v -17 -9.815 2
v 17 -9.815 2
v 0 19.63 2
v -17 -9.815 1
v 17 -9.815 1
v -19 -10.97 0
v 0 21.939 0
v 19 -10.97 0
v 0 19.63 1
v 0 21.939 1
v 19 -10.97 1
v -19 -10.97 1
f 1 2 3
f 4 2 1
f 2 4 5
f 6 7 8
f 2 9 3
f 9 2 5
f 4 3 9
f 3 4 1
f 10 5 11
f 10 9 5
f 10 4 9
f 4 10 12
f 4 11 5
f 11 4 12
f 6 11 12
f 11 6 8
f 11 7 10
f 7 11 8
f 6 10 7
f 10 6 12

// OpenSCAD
function centroid(p1, p2, p3) =
  [
    (p1.x + p2.x + p3.x) / 3,
    (p1.y + p2.y + p3.y) / 3
  ];

function tetrahedron_height(edge_length) = (sqrt(6) * edge_length) / 3;

module triangle(side_length) {
  half_side = side_length / 2;

  a = sqrt(side_length * side_length - half_side * half_side);

  points = [
    [0, a / 2],
    [half_side, -(a / 2)],
    [-half_side, -(a / 2)],
  ];

  c = centroid(points[0], points[1], points[2]);

  translate([-c.x, -c.y, 0]) {
    polygon(points);
  }
}

module tetrahedron(edge_length) {
  half_edge = edge_length / 2;

  a = sqrt(edge_length * edge_length - half_edge * half_edge);
  height = tetrahedron_height(edge_length);

  points = [
    [0, a / 2, 0],
    [half_edge, -(a / 2), 0],
    [-half_edge, -(a / 2), 0],
  ];

  c = centroid(points[0], points[1], points[2]);
  half_height = height / 4;
  top = [c.x, c.y, half_height];
  echo(height);
  echo(half_height);
  faces = [
    [2, 1, 0],
    [2, 3, 1],
    [0, 3, 2],
    [1, 3, 0],
  ];
  translate([-c.x, -c.y, 0]) {
    polyhedron(points = concat(points, [top]), faces = faces);
  }
}

thickness = 2;

module inner_shape(edge_length, inner_edge_length) {
  linear_extrude(thickness) {
    triangle(inner_edge_length);
  }
  translate([0, 0, thickness / 2]) {
    linear_extrude(thickness / 2) {
      triangle(inner_edge_length + thickness * 2);
    }
  }
}

module inside(edge_length, inner_edge_length) {
  difference() {
    tetrahedron(edge_length);
    translate([-(edge_length / 2), -(edge_length / 2), thickness]) {
      cube([edge_length * 2, edge_length * 2, edge_length * 2]);
    }
    inner_shape(edge_length, inner_edge_length);
    // linear_extrude(edge_length * 2) {
    //   triangle(inner_edge_length);
    // }
    // translate([0, 0, thickness / 2]) {
    //   linear_extrude(edge_length * 2) {
    //     triangle(inner_edge_length + thickness * 2);
    //   }
    // }
  }
}
// inside(50, 35);


module spaced() {
  for (i = [0 : 0]) {
    translate([i * 36, 0, 0]) {
      if (i % 2 == 0) {
        children();
      } else {
        mirror([0, 1, 0]) {
          children();
        }
      }
    }
  }
}

spaced() {

  translate([0, 0, thickness]) {
    mirror([0, 0, 1]) {
      inner_shape(49.0, 34.0);
    }
  }
}
